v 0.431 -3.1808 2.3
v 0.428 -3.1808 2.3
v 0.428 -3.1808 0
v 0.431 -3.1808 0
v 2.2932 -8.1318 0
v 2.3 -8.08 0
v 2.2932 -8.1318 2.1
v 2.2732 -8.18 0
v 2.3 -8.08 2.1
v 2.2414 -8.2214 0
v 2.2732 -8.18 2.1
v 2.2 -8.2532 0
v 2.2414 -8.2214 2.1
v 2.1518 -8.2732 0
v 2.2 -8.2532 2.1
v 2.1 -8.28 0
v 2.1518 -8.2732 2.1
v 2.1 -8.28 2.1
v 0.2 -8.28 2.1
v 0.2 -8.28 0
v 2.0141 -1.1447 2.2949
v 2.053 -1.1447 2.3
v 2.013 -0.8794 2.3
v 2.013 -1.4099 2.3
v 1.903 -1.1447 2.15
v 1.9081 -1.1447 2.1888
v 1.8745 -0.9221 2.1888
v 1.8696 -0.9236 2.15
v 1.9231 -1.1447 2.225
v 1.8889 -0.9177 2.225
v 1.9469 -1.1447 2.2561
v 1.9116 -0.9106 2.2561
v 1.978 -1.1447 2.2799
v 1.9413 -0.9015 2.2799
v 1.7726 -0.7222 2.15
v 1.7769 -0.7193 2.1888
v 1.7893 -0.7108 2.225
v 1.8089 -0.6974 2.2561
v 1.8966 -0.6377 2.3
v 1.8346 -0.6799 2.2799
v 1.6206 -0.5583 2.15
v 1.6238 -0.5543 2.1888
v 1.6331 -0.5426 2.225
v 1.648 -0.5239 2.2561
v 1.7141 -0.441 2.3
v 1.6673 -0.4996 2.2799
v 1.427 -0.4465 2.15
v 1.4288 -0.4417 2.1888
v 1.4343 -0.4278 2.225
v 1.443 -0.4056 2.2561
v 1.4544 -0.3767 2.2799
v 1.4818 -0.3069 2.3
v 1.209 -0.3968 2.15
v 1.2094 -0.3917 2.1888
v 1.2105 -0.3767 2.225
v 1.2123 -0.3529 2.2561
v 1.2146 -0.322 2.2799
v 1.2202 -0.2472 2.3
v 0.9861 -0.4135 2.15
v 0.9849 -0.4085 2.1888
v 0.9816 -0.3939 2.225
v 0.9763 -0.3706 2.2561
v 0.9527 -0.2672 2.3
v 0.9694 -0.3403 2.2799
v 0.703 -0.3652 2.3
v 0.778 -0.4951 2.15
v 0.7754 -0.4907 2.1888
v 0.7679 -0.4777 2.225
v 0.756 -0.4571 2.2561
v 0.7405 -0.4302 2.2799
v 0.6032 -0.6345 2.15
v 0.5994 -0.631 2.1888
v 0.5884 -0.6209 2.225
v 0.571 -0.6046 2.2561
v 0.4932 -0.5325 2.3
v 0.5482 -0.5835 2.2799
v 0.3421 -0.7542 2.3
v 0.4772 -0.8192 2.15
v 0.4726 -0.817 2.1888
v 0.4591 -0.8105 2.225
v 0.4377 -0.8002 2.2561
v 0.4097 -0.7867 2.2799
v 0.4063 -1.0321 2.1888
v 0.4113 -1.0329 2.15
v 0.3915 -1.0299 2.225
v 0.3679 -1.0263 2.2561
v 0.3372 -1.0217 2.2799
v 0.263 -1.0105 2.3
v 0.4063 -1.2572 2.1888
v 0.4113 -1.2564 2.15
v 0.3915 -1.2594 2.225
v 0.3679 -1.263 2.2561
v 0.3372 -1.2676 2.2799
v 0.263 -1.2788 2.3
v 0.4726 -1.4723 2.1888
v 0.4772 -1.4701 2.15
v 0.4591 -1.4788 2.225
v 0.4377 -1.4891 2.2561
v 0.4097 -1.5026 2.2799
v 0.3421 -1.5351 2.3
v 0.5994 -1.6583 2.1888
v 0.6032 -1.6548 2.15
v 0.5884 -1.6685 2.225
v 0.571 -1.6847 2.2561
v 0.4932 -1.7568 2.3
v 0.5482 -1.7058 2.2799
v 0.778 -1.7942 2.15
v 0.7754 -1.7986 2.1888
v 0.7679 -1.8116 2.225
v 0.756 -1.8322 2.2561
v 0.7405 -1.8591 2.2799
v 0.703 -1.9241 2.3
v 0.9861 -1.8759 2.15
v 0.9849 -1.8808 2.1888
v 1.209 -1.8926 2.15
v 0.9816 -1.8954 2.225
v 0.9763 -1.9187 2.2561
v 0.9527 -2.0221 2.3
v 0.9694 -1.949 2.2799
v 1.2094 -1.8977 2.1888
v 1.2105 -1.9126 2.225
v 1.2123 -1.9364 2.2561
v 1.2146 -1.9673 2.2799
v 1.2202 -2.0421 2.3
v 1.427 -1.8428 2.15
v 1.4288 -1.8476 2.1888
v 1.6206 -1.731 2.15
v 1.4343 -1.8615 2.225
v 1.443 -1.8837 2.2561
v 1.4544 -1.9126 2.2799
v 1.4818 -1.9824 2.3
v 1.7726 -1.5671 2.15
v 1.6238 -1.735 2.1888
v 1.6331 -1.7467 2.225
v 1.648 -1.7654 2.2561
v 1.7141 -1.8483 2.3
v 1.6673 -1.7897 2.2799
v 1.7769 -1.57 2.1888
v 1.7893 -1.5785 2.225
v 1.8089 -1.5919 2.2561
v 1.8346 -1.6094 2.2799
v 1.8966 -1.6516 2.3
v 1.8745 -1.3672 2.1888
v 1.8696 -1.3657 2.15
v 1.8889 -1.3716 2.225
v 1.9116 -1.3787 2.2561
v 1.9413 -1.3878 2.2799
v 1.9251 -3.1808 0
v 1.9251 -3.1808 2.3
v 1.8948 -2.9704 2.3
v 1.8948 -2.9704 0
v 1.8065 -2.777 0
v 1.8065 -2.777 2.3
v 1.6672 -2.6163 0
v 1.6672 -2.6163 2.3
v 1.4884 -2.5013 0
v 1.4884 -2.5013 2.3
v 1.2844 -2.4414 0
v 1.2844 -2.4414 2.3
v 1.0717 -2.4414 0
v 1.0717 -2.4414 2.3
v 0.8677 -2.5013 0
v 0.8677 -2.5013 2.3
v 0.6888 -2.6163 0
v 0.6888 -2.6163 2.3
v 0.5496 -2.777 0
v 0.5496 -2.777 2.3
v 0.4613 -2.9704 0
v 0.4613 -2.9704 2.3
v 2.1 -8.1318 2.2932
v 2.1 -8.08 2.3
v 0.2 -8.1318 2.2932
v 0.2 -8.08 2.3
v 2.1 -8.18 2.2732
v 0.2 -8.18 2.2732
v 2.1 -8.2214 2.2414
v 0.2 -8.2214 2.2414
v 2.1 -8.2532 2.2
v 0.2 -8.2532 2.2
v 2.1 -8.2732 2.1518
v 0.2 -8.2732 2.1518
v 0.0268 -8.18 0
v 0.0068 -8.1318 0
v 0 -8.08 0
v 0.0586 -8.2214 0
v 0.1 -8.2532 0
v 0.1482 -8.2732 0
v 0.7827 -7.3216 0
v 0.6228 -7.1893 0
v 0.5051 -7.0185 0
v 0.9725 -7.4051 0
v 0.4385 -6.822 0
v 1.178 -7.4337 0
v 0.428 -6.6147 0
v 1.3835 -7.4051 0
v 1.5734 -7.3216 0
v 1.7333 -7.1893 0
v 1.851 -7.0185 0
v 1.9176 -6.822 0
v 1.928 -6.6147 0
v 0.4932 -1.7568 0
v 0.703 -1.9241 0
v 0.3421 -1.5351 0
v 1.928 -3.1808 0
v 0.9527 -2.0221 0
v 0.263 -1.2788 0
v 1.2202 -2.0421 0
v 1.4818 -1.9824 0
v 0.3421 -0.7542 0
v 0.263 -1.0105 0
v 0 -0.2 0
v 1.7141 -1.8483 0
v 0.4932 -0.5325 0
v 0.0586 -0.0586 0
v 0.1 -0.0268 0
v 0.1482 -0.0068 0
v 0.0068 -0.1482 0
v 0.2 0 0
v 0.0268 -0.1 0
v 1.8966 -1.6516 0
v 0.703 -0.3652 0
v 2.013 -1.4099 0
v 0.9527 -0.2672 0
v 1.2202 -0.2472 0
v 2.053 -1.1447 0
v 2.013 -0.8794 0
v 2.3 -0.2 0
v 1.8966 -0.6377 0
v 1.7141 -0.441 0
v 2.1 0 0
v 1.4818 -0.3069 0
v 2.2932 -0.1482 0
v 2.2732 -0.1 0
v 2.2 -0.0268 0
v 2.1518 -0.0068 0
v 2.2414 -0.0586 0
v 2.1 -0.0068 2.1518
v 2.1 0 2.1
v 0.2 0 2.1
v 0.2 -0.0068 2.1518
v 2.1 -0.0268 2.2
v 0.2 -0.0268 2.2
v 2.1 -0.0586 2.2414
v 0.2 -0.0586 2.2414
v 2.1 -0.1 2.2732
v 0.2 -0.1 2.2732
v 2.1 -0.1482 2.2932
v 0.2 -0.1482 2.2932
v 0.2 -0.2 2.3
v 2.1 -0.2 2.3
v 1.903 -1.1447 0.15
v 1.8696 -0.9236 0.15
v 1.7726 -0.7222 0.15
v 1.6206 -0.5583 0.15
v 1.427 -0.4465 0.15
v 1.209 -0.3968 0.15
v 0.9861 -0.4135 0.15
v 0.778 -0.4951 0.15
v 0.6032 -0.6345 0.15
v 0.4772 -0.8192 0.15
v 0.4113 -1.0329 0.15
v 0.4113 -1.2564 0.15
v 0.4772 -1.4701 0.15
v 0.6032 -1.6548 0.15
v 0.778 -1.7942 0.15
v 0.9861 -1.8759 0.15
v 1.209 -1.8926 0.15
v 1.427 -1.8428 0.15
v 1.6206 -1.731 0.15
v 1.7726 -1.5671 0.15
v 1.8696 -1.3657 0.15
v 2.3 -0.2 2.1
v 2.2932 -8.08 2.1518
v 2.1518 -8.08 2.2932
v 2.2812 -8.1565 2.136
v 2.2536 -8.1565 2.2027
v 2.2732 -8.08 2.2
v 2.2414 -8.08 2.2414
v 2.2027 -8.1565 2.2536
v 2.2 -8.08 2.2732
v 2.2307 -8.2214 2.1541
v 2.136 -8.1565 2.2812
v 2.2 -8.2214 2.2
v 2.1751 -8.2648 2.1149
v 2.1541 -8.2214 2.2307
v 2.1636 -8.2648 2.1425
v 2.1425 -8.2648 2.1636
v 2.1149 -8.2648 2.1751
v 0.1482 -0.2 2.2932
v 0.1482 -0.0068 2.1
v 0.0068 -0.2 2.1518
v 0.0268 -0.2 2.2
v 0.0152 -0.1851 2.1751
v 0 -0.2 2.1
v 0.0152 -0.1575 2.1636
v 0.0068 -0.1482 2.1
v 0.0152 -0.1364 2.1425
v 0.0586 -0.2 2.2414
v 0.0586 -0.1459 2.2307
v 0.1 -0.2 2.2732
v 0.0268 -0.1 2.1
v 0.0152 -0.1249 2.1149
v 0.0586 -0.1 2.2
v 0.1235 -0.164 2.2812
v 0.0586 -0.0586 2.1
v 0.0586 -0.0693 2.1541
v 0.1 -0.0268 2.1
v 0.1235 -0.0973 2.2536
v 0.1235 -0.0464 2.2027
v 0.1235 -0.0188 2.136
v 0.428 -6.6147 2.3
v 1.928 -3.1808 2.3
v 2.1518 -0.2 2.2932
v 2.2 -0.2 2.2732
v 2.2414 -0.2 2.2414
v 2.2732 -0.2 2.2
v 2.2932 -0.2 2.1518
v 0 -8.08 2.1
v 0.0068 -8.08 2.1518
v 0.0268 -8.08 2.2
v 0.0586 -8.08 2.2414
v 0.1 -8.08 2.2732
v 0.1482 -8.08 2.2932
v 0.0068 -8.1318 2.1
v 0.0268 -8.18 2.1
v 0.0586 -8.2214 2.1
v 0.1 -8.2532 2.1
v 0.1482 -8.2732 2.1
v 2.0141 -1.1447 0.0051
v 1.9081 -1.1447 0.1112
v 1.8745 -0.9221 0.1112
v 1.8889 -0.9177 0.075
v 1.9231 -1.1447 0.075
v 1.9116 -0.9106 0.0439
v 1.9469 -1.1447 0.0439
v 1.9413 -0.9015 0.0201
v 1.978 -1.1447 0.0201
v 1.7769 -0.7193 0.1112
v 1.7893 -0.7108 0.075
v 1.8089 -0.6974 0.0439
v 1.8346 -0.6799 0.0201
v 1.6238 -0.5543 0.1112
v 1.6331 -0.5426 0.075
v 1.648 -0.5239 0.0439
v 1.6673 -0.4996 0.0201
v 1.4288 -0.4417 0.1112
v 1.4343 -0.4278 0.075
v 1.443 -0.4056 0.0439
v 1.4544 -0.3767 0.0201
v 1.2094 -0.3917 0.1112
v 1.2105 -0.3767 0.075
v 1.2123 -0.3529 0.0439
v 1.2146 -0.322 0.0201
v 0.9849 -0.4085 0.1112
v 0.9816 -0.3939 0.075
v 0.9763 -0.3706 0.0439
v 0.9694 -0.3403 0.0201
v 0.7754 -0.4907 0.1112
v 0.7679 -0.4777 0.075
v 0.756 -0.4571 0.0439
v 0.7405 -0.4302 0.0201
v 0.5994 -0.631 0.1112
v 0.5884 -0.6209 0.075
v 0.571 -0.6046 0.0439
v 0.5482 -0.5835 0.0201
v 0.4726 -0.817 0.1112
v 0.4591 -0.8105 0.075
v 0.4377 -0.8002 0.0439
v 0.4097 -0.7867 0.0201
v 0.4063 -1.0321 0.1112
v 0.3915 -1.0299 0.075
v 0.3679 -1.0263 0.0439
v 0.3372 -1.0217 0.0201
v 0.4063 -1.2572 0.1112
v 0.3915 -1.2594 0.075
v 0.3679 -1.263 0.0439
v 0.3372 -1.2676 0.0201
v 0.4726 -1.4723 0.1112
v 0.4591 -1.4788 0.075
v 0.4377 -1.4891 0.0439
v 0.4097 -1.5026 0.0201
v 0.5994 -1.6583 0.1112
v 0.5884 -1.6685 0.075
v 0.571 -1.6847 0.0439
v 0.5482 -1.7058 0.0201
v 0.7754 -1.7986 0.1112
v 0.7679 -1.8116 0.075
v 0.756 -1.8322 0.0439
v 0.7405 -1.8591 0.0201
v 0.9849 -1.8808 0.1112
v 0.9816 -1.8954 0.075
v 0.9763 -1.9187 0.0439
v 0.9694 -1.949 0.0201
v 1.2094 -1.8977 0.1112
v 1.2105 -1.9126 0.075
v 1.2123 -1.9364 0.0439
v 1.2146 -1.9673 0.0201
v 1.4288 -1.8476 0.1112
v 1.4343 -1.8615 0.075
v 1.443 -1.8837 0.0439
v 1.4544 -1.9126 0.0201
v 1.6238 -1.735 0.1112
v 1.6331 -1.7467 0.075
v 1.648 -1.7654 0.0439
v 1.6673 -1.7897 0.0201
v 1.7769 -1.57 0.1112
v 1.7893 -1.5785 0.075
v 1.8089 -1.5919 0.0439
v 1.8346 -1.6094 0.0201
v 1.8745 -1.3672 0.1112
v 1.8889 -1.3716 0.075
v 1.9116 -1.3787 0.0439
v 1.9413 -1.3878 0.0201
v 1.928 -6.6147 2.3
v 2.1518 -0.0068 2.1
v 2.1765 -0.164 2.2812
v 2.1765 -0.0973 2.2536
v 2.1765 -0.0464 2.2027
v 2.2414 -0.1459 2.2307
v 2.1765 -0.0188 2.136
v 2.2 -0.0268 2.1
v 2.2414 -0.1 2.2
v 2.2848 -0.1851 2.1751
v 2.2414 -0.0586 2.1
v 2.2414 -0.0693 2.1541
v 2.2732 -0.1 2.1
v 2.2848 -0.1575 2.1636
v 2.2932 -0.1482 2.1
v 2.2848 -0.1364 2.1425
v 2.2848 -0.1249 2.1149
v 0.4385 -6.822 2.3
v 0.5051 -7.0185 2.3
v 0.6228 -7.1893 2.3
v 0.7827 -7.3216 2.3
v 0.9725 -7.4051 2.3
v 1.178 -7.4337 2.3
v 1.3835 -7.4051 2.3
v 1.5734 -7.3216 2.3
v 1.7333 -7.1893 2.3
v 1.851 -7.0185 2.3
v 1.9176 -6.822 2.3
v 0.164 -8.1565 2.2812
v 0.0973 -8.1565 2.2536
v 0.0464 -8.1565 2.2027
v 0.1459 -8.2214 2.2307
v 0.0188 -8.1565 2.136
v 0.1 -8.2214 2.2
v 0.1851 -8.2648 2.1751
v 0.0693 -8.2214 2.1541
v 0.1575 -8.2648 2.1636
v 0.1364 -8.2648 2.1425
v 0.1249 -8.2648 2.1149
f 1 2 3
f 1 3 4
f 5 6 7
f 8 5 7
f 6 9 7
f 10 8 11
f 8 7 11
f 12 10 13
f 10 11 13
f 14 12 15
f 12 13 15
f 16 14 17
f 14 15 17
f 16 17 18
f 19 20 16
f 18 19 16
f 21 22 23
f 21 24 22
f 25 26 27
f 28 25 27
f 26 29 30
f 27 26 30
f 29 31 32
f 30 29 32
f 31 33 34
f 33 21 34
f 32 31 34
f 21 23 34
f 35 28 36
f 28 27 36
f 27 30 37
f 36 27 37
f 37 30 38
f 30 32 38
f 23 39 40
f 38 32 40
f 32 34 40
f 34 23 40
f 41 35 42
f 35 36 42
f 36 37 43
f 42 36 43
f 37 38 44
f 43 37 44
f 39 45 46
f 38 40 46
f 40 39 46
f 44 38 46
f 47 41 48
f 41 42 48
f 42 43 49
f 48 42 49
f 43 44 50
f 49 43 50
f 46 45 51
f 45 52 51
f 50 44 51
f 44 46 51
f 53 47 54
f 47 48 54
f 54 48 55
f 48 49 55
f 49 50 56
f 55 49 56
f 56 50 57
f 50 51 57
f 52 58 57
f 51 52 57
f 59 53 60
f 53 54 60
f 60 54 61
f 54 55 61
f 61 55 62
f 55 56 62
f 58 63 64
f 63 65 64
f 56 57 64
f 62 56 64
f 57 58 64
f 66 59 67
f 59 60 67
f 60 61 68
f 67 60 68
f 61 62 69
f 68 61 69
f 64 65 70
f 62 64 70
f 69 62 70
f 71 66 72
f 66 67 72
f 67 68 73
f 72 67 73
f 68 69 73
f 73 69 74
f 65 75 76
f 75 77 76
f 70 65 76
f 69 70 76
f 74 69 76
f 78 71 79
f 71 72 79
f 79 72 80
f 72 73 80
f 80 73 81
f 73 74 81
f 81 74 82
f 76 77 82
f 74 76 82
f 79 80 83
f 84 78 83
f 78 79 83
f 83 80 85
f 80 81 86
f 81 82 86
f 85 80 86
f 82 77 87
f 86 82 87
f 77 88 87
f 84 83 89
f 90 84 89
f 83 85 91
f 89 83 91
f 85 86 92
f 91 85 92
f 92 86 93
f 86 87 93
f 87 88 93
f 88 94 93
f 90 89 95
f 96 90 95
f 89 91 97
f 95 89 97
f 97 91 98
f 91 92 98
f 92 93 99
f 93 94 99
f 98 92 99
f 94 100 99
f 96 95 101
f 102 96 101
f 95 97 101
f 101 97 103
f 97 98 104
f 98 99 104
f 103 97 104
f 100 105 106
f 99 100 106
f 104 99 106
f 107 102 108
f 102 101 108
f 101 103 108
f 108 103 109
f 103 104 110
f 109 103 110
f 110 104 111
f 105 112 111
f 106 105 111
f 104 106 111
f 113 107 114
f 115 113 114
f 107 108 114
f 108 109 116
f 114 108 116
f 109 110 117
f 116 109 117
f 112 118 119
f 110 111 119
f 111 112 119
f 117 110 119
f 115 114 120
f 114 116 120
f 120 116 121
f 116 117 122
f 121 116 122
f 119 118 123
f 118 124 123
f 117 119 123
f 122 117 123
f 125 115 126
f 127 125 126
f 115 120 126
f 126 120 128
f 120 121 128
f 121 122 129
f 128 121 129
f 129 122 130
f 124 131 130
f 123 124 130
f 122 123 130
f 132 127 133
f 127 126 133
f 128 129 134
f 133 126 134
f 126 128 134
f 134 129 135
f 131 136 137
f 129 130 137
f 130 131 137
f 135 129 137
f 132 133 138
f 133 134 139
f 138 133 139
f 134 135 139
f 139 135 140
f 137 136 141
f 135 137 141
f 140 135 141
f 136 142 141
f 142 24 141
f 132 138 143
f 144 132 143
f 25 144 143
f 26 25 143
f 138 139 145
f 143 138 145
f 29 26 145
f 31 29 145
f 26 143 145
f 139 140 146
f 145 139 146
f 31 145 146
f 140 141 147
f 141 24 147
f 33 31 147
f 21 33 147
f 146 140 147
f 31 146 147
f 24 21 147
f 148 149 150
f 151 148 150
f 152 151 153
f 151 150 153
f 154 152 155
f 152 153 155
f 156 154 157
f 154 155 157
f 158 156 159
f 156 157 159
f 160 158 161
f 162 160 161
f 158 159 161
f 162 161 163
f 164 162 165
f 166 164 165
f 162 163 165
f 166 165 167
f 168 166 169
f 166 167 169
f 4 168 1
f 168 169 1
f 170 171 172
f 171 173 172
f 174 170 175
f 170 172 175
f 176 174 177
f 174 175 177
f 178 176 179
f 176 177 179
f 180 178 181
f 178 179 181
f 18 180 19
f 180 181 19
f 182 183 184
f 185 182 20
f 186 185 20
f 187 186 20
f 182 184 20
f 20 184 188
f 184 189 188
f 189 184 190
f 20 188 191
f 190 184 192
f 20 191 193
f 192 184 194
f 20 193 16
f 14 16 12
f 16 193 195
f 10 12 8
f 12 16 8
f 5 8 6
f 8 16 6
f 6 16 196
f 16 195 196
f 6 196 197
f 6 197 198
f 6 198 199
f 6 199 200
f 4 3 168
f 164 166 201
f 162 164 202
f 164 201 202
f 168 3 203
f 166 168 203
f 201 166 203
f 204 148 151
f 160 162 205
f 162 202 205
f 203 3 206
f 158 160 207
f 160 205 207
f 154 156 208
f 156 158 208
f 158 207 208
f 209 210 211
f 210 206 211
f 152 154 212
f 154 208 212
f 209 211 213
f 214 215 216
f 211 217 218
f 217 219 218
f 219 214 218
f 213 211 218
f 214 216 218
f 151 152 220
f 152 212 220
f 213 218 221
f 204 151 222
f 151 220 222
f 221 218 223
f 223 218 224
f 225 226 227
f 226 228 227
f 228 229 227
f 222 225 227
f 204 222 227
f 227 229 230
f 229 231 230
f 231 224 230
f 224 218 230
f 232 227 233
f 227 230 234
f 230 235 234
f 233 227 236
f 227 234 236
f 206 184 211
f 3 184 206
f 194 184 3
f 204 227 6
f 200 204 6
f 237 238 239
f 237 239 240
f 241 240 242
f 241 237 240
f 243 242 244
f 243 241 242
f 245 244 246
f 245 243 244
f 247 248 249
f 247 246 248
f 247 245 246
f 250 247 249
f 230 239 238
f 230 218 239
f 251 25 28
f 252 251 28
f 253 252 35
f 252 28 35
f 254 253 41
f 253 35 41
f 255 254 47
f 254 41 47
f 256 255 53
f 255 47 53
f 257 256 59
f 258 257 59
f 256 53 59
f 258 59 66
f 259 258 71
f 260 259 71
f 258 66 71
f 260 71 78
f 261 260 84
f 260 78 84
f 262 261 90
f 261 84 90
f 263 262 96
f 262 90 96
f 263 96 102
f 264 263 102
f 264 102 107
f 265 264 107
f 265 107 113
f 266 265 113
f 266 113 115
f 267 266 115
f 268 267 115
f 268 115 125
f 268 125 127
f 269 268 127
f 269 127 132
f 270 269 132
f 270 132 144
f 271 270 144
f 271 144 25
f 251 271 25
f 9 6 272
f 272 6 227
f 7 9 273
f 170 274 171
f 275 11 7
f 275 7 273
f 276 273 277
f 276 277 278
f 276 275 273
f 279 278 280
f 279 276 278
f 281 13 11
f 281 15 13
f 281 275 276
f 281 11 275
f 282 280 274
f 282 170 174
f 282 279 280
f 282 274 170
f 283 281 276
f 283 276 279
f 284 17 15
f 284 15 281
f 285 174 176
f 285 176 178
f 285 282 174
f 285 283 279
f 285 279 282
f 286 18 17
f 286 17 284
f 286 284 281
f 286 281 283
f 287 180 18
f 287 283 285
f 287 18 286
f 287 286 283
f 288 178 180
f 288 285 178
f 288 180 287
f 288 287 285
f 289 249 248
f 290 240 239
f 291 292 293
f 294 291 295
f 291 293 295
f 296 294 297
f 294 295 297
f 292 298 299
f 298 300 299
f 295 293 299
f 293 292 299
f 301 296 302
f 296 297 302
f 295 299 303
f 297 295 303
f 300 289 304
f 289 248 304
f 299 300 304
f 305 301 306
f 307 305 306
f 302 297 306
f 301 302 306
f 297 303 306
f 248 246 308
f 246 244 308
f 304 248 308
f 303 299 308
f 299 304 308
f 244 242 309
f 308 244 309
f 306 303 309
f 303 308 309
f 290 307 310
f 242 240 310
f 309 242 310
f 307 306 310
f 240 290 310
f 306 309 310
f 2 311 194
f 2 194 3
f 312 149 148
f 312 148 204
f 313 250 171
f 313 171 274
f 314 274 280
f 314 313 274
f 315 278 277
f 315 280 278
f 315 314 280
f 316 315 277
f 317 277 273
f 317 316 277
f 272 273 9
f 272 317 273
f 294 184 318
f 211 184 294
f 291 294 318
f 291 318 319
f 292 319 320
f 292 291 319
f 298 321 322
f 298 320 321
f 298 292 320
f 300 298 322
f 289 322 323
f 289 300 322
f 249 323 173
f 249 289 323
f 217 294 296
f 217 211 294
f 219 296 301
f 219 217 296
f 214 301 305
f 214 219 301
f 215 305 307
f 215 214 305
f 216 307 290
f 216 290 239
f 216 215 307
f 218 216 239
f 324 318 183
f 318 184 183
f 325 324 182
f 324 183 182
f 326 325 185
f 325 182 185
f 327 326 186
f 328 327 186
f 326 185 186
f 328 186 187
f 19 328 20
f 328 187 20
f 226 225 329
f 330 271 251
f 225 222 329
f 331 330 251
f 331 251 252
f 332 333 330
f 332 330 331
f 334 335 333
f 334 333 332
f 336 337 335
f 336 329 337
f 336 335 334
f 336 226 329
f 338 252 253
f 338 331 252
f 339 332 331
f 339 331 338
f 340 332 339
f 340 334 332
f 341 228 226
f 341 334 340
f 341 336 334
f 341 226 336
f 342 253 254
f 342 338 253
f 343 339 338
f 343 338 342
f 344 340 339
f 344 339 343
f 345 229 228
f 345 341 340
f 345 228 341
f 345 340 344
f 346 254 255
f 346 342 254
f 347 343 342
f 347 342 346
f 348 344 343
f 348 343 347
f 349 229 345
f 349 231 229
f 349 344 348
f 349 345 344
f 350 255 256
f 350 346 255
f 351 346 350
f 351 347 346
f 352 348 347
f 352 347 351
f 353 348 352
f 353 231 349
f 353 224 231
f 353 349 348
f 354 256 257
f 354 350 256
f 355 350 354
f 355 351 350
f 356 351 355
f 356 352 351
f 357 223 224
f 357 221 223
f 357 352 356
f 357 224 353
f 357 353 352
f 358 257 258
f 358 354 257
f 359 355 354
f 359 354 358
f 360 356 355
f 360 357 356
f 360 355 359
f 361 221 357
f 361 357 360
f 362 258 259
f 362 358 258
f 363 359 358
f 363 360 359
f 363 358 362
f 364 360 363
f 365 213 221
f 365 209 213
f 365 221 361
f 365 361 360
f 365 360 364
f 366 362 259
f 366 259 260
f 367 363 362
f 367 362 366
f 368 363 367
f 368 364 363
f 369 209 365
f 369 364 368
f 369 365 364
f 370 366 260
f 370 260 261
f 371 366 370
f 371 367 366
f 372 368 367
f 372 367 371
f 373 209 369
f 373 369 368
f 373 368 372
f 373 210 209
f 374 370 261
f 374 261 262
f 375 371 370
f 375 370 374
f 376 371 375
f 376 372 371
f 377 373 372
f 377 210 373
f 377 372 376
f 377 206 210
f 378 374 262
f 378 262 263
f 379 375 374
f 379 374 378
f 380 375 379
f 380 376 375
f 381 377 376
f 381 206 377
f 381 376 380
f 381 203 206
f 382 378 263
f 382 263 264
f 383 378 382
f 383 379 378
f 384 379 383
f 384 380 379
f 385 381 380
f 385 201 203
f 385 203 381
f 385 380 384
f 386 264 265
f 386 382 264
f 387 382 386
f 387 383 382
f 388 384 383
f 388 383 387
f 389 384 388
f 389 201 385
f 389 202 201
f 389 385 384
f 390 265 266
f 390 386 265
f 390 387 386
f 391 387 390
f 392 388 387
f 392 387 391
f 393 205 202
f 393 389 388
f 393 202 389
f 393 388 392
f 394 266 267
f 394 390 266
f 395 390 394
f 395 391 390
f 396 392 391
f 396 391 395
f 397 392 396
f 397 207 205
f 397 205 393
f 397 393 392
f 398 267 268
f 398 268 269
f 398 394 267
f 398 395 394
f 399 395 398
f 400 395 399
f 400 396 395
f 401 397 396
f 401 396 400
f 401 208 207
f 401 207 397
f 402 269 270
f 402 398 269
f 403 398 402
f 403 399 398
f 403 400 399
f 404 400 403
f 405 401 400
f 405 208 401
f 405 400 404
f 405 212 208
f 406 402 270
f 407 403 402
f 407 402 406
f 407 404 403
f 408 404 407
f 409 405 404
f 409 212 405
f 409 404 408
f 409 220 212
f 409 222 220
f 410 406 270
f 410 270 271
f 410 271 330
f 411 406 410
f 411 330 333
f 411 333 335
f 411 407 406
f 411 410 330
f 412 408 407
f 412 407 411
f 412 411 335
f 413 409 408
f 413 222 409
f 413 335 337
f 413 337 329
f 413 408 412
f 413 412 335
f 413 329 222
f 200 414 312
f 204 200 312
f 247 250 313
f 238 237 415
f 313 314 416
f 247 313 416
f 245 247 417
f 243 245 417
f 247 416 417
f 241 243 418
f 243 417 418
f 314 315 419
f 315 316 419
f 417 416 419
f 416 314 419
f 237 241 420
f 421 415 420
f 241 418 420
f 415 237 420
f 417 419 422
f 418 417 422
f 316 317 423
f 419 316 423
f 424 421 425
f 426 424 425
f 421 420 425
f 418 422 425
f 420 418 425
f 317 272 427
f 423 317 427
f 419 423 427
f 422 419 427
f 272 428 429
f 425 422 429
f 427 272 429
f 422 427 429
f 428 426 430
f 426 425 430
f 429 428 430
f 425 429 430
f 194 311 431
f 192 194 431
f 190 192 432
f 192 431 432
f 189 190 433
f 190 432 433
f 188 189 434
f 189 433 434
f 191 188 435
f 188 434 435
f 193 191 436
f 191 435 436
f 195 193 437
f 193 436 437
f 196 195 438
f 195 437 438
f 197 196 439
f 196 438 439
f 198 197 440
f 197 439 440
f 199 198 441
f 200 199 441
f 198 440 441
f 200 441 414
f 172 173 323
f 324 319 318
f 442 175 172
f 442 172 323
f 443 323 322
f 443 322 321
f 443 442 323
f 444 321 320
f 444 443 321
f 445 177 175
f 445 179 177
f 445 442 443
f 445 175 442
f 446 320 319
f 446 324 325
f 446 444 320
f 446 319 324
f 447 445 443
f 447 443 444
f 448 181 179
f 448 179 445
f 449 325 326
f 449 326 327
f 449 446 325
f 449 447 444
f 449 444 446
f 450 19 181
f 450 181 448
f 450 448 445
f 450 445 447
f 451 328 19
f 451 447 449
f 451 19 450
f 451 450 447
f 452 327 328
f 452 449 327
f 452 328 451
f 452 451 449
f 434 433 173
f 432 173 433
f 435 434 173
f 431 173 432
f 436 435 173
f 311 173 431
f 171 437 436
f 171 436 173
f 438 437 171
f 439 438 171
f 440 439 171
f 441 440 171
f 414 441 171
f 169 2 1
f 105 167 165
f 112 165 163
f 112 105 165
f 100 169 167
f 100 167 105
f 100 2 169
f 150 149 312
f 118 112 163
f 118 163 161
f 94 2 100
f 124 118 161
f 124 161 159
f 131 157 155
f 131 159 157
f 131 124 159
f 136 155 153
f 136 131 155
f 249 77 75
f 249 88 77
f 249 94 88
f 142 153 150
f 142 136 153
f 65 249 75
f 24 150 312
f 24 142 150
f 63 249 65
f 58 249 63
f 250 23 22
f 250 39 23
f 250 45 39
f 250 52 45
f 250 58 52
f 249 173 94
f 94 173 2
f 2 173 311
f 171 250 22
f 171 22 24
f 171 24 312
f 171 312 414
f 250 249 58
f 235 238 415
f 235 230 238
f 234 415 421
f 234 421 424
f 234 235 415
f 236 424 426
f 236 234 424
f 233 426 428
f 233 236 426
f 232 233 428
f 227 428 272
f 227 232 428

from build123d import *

# Parameters (mm, degrees)
SKETCH1_W           = 2.3
SKETCH1_H           = 8.28
BOSS_EXTRUDE1_DEPTH = 2.3
SKETCH4_R           = 0.75
CUT_EXTRUDE3_DEPTH  = 2.627407371
FILLET7_R           = 0.2
FILLET8_R           = 0.2
FILLET9_R           = 0.2
FILLET10_R          = 0.2
FILLET12_R          = 0.15
FILLET13_R          = 0.15
SKETCH9_R           = 0.747027578
SKETCH9_R_2         = 0.752905599
SKETCH9_W           = 1.5
SKETCH9_H           = 3.5
CUT_EXTRUDE4_DEPTH  = 2.3


with BuildPart() as part:
    # Sketch1 → Boss-Extrude1 (new body)
    with BuildSketch(Plane.XY):
        with Locations((1.15, -4.14)):
            Rectangle(SKETCH1_W, SKETCH1_H)
    extrude(amount=BOSS_EXTRUDE1_DEPTH)

    # Sketch4 → Cut-Extrude3 (cut)
    with BuildSketch(Plane(origin=(-0.047615046, -0.231066523, 2.3), x_dir=(1, 0, 0), z_dir=(0, 0, 1))):
        with Locations((1.200582347, -0.913587841)):
            Circle(SKETCH4_R)
    extrude(amount=-CUT_EXTRUDE3_DEPTH, mode=Mode.SUBTRACT)

    # Fillet7
    fillet7_edges = [part.edges().sort_by_distance(p)[0] for p in [
        (1.15, 0, 2.3),
    ]]
    fillet(fillet7_edges, radius=FILLET7_R)

    # Fillet8
    fillet8_edges = [part.edges().sort_by_distance(p)[0] for p in [
        (2.3, -4.24, 2.3),
        (2.3, 0, 1.05),
        (2.3, -0.058578644, 2.241421356),
    ]]
    fillet(fillet8_edges, radius=FILLET8_R)

    # Fillet9
    fillet9_edges = [part.edges().sort_by_distance(p)[0] for p in [
        (0, -4.24, 2.3),
        (0, 0, 1.05),
        (0, -0.058578644, 2.241421356),
    ]]
    fillet(fillet9_edges, radius=FILLET9_R)

    # Fillet10
    fillet10_edges = [part.edges().sort_by_distance(p)[0] for p in [
        (2.3, -8.28, 1.05),
        (2.241421356, -8.28, 2.241421356),
        (0, -8.28, 1.05),
        (1.15, -8.28, 2.3),
        (0.058578644, -8.28, 2.241421356),
    ]]
    fillet(fillet10_edges, radius=FILLET10_R)

    # Fillet12
    fillet12_edges = [part.edges().sort_by_distance(p)[0] for p in [
        (0.402967301, -1.144654364, 2.3),
    ]]
    fillet(fillet12_edges, radius=FILLET12_R)

    # Fillet13
    fillet13_edges = [part.edges().sort_by_distance(p)[0] for p in [
        (0.402967301, -1.144654364, 0),
    ]]
    fillet(fillet13_edges, radius=FILLET13_R)

    # Sketch9 → Cut-Extrude4 (cut)
    with BuildSketch(Plane(origin=(0, -0.220326659, 2.3), x_dir=(1, 0, 0), z_dir=(0, 0, 1))):
        with Locations((1.178039953, -2.960502764)):
            Circle(SKETCH9_R)
        with Locations((1.178039953, -6.460502764)):
            Circle(SKETCH9_R_2)
        with Locations((1.178039953, -4.710502764)):
            Rectangle(SKETCH9_W, SKETCH9_H)
    extrude(amount=-CUT_EXTRUDE4_DEPTH, mode=Mode.SUBTRACT)


solid = part.part
